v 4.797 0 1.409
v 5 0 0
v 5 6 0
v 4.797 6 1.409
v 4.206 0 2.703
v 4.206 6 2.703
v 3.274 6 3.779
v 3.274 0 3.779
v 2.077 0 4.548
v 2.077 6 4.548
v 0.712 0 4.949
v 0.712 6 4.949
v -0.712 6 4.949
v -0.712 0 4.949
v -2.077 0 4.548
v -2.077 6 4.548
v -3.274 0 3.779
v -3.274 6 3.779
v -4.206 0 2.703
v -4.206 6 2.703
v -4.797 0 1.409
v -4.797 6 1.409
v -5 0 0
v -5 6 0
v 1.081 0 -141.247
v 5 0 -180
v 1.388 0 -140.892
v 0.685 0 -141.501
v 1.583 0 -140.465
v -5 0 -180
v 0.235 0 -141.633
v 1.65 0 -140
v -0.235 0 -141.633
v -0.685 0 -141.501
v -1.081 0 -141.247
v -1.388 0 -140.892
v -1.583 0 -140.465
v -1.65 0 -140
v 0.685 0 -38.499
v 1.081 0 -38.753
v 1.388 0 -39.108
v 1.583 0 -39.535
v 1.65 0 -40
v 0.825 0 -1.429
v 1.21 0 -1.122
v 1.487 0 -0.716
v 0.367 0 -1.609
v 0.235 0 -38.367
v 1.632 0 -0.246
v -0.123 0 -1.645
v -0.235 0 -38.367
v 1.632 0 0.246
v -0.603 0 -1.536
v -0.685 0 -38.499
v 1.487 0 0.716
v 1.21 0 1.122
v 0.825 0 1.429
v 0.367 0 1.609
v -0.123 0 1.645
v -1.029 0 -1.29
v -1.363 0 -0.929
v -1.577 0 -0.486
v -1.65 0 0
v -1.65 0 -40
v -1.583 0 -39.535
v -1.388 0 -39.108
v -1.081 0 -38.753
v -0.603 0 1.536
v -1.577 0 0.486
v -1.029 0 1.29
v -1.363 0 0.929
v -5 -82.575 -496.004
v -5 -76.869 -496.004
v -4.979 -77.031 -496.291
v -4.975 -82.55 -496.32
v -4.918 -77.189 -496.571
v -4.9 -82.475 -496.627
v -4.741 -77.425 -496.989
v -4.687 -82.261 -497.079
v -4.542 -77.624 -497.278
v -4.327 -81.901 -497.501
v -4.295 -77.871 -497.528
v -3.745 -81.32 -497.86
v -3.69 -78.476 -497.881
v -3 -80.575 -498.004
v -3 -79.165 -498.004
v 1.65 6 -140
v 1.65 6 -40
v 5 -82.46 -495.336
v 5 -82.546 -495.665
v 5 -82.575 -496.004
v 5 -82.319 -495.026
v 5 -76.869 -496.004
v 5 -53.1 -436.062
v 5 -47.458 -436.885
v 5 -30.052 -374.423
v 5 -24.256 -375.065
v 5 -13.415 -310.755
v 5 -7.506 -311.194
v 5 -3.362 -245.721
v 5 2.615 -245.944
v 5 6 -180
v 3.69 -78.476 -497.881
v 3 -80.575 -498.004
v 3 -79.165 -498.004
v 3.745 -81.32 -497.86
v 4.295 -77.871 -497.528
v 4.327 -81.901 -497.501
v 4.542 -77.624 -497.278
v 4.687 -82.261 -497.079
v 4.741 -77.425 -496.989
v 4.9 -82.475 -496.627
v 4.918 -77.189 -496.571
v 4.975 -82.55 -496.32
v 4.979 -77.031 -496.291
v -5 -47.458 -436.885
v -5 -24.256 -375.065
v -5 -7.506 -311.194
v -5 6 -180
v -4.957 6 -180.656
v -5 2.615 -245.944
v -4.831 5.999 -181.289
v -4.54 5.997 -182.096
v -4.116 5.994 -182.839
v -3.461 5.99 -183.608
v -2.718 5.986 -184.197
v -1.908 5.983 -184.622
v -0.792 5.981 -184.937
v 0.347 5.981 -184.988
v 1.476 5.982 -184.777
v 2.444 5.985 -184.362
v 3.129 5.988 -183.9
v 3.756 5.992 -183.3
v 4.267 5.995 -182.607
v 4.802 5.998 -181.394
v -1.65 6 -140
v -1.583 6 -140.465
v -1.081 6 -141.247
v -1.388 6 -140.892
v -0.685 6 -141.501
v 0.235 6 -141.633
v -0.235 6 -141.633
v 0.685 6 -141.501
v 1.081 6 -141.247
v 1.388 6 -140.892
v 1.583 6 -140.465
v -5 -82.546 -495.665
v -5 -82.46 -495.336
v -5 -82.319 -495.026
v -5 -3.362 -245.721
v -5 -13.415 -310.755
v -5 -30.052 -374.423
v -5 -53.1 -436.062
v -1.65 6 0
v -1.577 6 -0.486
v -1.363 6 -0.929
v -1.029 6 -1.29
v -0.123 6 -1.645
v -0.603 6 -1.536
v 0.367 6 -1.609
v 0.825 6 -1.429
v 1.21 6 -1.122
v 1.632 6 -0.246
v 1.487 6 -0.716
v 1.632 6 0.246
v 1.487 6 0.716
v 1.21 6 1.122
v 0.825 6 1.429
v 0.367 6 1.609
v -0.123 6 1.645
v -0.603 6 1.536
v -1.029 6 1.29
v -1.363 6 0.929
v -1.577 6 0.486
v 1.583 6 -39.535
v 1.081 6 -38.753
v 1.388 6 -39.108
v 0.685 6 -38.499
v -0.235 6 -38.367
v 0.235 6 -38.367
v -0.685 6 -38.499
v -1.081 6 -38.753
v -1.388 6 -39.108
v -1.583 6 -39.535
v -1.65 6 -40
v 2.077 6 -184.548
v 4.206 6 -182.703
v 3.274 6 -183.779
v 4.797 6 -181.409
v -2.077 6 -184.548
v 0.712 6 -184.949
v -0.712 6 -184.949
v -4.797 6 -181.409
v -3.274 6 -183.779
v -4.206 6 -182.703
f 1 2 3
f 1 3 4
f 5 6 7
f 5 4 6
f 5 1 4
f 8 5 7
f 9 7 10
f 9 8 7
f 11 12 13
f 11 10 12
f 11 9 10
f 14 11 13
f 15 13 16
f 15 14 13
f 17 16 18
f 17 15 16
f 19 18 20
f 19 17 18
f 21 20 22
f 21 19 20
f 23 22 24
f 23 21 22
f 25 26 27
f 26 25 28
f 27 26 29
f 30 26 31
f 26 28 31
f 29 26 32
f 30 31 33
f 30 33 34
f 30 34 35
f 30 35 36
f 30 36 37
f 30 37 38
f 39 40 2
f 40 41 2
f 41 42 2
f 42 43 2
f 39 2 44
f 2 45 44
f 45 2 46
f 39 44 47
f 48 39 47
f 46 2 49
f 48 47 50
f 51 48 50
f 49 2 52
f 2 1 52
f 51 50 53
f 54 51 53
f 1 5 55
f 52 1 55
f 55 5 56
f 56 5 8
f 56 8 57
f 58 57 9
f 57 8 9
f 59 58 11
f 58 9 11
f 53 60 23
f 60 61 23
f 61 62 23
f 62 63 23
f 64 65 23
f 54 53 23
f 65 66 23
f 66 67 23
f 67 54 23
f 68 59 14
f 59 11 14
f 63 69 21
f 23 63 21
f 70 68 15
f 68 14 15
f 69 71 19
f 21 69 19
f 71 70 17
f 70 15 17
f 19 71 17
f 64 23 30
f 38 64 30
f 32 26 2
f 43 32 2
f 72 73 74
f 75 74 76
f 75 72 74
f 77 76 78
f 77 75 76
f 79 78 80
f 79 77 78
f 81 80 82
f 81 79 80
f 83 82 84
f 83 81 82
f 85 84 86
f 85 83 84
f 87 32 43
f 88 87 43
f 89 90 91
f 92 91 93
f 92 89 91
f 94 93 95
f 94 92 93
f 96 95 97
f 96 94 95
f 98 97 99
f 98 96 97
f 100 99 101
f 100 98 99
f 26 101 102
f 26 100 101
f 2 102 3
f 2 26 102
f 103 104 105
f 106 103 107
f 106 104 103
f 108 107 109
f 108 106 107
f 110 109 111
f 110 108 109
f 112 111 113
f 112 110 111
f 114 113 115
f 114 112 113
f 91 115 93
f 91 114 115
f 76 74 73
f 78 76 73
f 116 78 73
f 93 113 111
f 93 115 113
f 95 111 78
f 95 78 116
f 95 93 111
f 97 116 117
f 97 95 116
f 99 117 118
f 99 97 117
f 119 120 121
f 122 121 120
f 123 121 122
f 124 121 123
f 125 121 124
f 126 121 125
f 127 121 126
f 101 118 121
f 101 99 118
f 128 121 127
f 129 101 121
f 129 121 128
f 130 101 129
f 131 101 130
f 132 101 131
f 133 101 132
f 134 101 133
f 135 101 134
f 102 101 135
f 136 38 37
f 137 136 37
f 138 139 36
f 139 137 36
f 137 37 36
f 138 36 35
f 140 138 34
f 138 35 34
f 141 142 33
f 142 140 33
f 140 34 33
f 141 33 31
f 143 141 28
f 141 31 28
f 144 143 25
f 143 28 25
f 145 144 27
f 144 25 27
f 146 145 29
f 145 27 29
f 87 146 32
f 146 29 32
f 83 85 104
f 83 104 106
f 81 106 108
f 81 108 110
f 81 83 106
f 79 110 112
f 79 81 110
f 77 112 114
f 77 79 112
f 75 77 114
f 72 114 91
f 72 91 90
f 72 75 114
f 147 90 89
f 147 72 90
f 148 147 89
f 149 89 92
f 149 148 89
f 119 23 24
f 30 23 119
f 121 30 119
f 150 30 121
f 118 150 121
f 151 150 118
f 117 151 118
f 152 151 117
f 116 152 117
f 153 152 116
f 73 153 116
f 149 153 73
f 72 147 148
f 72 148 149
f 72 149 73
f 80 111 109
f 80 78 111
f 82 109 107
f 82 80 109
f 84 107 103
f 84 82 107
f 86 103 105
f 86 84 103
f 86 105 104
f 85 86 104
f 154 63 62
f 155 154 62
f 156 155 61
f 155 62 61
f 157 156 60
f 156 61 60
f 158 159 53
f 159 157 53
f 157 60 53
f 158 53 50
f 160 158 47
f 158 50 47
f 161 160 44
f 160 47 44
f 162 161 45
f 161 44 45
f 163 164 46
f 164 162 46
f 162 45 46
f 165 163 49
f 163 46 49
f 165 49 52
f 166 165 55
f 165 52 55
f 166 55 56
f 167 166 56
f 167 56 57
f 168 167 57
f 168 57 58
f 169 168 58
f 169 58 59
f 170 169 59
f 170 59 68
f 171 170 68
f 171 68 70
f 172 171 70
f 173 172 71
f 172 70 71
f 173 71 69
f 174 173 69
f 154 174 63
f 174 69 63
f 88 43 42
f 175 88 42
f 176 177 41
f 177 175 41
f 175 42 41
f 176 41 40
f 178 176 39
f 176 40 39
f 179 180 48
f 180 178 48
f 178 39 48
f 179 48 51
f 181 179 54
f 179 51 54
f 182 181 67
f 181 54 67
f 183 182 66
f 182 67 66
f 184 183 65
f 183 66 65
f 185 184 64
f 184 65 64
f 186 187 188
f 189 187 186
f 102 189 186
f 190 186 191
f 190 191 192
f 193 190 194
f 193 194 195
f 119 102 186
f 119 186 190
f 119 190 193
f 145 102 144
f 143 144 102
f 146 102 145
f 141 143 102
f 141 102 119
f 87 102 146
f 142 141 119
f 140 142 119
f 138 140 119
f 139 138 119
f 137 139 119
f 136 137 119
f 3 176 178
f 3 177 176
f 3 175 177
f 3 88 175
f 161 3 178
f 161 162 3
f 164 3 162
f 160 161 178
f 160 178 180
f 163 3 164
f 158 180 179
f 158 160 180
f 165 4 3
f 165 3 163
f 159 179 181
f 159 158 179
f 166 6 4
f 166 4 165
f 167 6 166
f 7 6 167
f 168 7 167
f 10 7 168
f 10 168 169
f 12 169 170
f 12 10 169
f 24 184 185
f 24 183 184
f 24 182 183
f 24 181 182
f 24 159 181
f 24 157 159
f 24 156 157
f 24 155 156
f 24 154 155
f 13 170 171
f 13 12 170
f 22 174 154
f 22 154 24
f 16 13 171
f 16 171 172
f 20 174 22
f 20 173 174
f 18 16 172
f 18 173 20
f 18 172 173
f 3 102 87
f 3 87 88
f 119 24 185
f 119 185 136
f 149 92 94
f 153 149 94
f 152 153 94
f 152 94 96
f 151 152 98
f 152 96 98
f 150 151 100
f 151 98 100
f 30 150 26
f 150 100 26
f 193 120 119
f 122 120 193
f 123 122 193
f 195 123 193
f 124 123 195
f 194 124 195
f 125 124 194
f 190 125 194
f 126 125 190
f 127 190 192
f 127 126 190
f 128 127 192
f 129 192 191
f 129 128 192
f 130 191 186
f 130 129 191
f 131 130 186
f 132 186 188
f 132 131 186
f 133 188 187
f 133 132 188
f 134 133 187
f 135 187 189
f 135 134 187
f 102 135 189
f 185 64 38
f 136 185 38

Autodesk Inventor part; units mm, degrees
ref_plane "YZ Plane" through (0, 0, 0) normal (1, 0, 0) x (0, 1, 0)
ref_plane "XZ Plane" through (0, 0, 0) normal (0, 1, 0) x (-1, 0, 0)
ref_plane "XY Plane" through (0, 0, 0) normal (0, 0, 1) x (1, 0, 0)
sketch "Sketch1" plane through (0, 0, 0) normal (0, 1, 0) x (-1, 0, 0)
  line L0 (0, 0) -> (0, -180) construction
  line L1 (5, 0) -> (5, -180)
  line L2 (-5, -180) -> (-5, 0)
  arc A0 (5, 0) -> (-5, 0) centre (0, 0) ccw
  arc A1 (-5, -180) -> (5, -180) centre (0, -180) ccw
  circle A2 centre (0, 0) radius 1.65
  line L3 (0, -40) -> (0, -140) construction
  line L4 (1.65, -40) -> (1.65, -140)
  line L5 (-1.65, -140) -> (-1.65, -40)
  arc A3 (1.65, -40) -> (-1.65, -40) centre (0, -40) ccw
  arc A4 (-1.65, -140) -> (1.65, -140) centre (0, -140) ccw
  point P0 (0, -90)
  point P1 (0, -90)
  dimension "d0" = 180
  dimension "d1" = 10
  dimension "d2" = 3.3
  dimension "d3" = 40
  dimension "d5" = 140
  dimension "d6" = 3.3
extrude "Extrusion1" add sketch "Sketch1" along normal blind 6
sketch "Sketch2" plane through (5, 0, 0) normal (1, 0, 0) x (0, 0, -1)
  line L0 (180, 0) -> (180, 6) projected
  line L1 (0, 0) -> (180, 0) projected
  line L2 (180, 0) -> (180, 6) projected
  line L3 (0, 6) -> (180, 6) projected
  line L4 (0, 0) -> (0, 6) projected
  line L5 (180, 0) -> (180, 0) projected
  line L6 (180, 0) -> (180, 6) projected
  line L7 (180, 6) -> (180, 6) projected
  line L8 (180, 0) -> (180, 6) projected
  line L9 (180, 0) -> (0, 0) projected
  arc A0 (498.004, -84) -> (180, 0) centre (180, -643.9437) ccw
  line L10 (180, 6) -> (0, 6) projected
  arc A1 (498.004, -78) -> (180, 6) centre (180, -637.9437) ccw
  line L11 (498.004, -78) -> (498.004, -84)
  line L12 (0, 0) -> (180, 0) projected
  dimension "d9" = 6
  dimension "d10" = 498.004
  dimension "d11" = 90
extrude "Extrusion2" add sketch "Sketch2" against normal blind 10 contours L0 A1 L11 A0
fillet "Fillet1" radius 2 4 edges at (0, -78, -498.004) (5, -81, -498.004) (-5, -81, -498.004) (0, -84, -498.004)
